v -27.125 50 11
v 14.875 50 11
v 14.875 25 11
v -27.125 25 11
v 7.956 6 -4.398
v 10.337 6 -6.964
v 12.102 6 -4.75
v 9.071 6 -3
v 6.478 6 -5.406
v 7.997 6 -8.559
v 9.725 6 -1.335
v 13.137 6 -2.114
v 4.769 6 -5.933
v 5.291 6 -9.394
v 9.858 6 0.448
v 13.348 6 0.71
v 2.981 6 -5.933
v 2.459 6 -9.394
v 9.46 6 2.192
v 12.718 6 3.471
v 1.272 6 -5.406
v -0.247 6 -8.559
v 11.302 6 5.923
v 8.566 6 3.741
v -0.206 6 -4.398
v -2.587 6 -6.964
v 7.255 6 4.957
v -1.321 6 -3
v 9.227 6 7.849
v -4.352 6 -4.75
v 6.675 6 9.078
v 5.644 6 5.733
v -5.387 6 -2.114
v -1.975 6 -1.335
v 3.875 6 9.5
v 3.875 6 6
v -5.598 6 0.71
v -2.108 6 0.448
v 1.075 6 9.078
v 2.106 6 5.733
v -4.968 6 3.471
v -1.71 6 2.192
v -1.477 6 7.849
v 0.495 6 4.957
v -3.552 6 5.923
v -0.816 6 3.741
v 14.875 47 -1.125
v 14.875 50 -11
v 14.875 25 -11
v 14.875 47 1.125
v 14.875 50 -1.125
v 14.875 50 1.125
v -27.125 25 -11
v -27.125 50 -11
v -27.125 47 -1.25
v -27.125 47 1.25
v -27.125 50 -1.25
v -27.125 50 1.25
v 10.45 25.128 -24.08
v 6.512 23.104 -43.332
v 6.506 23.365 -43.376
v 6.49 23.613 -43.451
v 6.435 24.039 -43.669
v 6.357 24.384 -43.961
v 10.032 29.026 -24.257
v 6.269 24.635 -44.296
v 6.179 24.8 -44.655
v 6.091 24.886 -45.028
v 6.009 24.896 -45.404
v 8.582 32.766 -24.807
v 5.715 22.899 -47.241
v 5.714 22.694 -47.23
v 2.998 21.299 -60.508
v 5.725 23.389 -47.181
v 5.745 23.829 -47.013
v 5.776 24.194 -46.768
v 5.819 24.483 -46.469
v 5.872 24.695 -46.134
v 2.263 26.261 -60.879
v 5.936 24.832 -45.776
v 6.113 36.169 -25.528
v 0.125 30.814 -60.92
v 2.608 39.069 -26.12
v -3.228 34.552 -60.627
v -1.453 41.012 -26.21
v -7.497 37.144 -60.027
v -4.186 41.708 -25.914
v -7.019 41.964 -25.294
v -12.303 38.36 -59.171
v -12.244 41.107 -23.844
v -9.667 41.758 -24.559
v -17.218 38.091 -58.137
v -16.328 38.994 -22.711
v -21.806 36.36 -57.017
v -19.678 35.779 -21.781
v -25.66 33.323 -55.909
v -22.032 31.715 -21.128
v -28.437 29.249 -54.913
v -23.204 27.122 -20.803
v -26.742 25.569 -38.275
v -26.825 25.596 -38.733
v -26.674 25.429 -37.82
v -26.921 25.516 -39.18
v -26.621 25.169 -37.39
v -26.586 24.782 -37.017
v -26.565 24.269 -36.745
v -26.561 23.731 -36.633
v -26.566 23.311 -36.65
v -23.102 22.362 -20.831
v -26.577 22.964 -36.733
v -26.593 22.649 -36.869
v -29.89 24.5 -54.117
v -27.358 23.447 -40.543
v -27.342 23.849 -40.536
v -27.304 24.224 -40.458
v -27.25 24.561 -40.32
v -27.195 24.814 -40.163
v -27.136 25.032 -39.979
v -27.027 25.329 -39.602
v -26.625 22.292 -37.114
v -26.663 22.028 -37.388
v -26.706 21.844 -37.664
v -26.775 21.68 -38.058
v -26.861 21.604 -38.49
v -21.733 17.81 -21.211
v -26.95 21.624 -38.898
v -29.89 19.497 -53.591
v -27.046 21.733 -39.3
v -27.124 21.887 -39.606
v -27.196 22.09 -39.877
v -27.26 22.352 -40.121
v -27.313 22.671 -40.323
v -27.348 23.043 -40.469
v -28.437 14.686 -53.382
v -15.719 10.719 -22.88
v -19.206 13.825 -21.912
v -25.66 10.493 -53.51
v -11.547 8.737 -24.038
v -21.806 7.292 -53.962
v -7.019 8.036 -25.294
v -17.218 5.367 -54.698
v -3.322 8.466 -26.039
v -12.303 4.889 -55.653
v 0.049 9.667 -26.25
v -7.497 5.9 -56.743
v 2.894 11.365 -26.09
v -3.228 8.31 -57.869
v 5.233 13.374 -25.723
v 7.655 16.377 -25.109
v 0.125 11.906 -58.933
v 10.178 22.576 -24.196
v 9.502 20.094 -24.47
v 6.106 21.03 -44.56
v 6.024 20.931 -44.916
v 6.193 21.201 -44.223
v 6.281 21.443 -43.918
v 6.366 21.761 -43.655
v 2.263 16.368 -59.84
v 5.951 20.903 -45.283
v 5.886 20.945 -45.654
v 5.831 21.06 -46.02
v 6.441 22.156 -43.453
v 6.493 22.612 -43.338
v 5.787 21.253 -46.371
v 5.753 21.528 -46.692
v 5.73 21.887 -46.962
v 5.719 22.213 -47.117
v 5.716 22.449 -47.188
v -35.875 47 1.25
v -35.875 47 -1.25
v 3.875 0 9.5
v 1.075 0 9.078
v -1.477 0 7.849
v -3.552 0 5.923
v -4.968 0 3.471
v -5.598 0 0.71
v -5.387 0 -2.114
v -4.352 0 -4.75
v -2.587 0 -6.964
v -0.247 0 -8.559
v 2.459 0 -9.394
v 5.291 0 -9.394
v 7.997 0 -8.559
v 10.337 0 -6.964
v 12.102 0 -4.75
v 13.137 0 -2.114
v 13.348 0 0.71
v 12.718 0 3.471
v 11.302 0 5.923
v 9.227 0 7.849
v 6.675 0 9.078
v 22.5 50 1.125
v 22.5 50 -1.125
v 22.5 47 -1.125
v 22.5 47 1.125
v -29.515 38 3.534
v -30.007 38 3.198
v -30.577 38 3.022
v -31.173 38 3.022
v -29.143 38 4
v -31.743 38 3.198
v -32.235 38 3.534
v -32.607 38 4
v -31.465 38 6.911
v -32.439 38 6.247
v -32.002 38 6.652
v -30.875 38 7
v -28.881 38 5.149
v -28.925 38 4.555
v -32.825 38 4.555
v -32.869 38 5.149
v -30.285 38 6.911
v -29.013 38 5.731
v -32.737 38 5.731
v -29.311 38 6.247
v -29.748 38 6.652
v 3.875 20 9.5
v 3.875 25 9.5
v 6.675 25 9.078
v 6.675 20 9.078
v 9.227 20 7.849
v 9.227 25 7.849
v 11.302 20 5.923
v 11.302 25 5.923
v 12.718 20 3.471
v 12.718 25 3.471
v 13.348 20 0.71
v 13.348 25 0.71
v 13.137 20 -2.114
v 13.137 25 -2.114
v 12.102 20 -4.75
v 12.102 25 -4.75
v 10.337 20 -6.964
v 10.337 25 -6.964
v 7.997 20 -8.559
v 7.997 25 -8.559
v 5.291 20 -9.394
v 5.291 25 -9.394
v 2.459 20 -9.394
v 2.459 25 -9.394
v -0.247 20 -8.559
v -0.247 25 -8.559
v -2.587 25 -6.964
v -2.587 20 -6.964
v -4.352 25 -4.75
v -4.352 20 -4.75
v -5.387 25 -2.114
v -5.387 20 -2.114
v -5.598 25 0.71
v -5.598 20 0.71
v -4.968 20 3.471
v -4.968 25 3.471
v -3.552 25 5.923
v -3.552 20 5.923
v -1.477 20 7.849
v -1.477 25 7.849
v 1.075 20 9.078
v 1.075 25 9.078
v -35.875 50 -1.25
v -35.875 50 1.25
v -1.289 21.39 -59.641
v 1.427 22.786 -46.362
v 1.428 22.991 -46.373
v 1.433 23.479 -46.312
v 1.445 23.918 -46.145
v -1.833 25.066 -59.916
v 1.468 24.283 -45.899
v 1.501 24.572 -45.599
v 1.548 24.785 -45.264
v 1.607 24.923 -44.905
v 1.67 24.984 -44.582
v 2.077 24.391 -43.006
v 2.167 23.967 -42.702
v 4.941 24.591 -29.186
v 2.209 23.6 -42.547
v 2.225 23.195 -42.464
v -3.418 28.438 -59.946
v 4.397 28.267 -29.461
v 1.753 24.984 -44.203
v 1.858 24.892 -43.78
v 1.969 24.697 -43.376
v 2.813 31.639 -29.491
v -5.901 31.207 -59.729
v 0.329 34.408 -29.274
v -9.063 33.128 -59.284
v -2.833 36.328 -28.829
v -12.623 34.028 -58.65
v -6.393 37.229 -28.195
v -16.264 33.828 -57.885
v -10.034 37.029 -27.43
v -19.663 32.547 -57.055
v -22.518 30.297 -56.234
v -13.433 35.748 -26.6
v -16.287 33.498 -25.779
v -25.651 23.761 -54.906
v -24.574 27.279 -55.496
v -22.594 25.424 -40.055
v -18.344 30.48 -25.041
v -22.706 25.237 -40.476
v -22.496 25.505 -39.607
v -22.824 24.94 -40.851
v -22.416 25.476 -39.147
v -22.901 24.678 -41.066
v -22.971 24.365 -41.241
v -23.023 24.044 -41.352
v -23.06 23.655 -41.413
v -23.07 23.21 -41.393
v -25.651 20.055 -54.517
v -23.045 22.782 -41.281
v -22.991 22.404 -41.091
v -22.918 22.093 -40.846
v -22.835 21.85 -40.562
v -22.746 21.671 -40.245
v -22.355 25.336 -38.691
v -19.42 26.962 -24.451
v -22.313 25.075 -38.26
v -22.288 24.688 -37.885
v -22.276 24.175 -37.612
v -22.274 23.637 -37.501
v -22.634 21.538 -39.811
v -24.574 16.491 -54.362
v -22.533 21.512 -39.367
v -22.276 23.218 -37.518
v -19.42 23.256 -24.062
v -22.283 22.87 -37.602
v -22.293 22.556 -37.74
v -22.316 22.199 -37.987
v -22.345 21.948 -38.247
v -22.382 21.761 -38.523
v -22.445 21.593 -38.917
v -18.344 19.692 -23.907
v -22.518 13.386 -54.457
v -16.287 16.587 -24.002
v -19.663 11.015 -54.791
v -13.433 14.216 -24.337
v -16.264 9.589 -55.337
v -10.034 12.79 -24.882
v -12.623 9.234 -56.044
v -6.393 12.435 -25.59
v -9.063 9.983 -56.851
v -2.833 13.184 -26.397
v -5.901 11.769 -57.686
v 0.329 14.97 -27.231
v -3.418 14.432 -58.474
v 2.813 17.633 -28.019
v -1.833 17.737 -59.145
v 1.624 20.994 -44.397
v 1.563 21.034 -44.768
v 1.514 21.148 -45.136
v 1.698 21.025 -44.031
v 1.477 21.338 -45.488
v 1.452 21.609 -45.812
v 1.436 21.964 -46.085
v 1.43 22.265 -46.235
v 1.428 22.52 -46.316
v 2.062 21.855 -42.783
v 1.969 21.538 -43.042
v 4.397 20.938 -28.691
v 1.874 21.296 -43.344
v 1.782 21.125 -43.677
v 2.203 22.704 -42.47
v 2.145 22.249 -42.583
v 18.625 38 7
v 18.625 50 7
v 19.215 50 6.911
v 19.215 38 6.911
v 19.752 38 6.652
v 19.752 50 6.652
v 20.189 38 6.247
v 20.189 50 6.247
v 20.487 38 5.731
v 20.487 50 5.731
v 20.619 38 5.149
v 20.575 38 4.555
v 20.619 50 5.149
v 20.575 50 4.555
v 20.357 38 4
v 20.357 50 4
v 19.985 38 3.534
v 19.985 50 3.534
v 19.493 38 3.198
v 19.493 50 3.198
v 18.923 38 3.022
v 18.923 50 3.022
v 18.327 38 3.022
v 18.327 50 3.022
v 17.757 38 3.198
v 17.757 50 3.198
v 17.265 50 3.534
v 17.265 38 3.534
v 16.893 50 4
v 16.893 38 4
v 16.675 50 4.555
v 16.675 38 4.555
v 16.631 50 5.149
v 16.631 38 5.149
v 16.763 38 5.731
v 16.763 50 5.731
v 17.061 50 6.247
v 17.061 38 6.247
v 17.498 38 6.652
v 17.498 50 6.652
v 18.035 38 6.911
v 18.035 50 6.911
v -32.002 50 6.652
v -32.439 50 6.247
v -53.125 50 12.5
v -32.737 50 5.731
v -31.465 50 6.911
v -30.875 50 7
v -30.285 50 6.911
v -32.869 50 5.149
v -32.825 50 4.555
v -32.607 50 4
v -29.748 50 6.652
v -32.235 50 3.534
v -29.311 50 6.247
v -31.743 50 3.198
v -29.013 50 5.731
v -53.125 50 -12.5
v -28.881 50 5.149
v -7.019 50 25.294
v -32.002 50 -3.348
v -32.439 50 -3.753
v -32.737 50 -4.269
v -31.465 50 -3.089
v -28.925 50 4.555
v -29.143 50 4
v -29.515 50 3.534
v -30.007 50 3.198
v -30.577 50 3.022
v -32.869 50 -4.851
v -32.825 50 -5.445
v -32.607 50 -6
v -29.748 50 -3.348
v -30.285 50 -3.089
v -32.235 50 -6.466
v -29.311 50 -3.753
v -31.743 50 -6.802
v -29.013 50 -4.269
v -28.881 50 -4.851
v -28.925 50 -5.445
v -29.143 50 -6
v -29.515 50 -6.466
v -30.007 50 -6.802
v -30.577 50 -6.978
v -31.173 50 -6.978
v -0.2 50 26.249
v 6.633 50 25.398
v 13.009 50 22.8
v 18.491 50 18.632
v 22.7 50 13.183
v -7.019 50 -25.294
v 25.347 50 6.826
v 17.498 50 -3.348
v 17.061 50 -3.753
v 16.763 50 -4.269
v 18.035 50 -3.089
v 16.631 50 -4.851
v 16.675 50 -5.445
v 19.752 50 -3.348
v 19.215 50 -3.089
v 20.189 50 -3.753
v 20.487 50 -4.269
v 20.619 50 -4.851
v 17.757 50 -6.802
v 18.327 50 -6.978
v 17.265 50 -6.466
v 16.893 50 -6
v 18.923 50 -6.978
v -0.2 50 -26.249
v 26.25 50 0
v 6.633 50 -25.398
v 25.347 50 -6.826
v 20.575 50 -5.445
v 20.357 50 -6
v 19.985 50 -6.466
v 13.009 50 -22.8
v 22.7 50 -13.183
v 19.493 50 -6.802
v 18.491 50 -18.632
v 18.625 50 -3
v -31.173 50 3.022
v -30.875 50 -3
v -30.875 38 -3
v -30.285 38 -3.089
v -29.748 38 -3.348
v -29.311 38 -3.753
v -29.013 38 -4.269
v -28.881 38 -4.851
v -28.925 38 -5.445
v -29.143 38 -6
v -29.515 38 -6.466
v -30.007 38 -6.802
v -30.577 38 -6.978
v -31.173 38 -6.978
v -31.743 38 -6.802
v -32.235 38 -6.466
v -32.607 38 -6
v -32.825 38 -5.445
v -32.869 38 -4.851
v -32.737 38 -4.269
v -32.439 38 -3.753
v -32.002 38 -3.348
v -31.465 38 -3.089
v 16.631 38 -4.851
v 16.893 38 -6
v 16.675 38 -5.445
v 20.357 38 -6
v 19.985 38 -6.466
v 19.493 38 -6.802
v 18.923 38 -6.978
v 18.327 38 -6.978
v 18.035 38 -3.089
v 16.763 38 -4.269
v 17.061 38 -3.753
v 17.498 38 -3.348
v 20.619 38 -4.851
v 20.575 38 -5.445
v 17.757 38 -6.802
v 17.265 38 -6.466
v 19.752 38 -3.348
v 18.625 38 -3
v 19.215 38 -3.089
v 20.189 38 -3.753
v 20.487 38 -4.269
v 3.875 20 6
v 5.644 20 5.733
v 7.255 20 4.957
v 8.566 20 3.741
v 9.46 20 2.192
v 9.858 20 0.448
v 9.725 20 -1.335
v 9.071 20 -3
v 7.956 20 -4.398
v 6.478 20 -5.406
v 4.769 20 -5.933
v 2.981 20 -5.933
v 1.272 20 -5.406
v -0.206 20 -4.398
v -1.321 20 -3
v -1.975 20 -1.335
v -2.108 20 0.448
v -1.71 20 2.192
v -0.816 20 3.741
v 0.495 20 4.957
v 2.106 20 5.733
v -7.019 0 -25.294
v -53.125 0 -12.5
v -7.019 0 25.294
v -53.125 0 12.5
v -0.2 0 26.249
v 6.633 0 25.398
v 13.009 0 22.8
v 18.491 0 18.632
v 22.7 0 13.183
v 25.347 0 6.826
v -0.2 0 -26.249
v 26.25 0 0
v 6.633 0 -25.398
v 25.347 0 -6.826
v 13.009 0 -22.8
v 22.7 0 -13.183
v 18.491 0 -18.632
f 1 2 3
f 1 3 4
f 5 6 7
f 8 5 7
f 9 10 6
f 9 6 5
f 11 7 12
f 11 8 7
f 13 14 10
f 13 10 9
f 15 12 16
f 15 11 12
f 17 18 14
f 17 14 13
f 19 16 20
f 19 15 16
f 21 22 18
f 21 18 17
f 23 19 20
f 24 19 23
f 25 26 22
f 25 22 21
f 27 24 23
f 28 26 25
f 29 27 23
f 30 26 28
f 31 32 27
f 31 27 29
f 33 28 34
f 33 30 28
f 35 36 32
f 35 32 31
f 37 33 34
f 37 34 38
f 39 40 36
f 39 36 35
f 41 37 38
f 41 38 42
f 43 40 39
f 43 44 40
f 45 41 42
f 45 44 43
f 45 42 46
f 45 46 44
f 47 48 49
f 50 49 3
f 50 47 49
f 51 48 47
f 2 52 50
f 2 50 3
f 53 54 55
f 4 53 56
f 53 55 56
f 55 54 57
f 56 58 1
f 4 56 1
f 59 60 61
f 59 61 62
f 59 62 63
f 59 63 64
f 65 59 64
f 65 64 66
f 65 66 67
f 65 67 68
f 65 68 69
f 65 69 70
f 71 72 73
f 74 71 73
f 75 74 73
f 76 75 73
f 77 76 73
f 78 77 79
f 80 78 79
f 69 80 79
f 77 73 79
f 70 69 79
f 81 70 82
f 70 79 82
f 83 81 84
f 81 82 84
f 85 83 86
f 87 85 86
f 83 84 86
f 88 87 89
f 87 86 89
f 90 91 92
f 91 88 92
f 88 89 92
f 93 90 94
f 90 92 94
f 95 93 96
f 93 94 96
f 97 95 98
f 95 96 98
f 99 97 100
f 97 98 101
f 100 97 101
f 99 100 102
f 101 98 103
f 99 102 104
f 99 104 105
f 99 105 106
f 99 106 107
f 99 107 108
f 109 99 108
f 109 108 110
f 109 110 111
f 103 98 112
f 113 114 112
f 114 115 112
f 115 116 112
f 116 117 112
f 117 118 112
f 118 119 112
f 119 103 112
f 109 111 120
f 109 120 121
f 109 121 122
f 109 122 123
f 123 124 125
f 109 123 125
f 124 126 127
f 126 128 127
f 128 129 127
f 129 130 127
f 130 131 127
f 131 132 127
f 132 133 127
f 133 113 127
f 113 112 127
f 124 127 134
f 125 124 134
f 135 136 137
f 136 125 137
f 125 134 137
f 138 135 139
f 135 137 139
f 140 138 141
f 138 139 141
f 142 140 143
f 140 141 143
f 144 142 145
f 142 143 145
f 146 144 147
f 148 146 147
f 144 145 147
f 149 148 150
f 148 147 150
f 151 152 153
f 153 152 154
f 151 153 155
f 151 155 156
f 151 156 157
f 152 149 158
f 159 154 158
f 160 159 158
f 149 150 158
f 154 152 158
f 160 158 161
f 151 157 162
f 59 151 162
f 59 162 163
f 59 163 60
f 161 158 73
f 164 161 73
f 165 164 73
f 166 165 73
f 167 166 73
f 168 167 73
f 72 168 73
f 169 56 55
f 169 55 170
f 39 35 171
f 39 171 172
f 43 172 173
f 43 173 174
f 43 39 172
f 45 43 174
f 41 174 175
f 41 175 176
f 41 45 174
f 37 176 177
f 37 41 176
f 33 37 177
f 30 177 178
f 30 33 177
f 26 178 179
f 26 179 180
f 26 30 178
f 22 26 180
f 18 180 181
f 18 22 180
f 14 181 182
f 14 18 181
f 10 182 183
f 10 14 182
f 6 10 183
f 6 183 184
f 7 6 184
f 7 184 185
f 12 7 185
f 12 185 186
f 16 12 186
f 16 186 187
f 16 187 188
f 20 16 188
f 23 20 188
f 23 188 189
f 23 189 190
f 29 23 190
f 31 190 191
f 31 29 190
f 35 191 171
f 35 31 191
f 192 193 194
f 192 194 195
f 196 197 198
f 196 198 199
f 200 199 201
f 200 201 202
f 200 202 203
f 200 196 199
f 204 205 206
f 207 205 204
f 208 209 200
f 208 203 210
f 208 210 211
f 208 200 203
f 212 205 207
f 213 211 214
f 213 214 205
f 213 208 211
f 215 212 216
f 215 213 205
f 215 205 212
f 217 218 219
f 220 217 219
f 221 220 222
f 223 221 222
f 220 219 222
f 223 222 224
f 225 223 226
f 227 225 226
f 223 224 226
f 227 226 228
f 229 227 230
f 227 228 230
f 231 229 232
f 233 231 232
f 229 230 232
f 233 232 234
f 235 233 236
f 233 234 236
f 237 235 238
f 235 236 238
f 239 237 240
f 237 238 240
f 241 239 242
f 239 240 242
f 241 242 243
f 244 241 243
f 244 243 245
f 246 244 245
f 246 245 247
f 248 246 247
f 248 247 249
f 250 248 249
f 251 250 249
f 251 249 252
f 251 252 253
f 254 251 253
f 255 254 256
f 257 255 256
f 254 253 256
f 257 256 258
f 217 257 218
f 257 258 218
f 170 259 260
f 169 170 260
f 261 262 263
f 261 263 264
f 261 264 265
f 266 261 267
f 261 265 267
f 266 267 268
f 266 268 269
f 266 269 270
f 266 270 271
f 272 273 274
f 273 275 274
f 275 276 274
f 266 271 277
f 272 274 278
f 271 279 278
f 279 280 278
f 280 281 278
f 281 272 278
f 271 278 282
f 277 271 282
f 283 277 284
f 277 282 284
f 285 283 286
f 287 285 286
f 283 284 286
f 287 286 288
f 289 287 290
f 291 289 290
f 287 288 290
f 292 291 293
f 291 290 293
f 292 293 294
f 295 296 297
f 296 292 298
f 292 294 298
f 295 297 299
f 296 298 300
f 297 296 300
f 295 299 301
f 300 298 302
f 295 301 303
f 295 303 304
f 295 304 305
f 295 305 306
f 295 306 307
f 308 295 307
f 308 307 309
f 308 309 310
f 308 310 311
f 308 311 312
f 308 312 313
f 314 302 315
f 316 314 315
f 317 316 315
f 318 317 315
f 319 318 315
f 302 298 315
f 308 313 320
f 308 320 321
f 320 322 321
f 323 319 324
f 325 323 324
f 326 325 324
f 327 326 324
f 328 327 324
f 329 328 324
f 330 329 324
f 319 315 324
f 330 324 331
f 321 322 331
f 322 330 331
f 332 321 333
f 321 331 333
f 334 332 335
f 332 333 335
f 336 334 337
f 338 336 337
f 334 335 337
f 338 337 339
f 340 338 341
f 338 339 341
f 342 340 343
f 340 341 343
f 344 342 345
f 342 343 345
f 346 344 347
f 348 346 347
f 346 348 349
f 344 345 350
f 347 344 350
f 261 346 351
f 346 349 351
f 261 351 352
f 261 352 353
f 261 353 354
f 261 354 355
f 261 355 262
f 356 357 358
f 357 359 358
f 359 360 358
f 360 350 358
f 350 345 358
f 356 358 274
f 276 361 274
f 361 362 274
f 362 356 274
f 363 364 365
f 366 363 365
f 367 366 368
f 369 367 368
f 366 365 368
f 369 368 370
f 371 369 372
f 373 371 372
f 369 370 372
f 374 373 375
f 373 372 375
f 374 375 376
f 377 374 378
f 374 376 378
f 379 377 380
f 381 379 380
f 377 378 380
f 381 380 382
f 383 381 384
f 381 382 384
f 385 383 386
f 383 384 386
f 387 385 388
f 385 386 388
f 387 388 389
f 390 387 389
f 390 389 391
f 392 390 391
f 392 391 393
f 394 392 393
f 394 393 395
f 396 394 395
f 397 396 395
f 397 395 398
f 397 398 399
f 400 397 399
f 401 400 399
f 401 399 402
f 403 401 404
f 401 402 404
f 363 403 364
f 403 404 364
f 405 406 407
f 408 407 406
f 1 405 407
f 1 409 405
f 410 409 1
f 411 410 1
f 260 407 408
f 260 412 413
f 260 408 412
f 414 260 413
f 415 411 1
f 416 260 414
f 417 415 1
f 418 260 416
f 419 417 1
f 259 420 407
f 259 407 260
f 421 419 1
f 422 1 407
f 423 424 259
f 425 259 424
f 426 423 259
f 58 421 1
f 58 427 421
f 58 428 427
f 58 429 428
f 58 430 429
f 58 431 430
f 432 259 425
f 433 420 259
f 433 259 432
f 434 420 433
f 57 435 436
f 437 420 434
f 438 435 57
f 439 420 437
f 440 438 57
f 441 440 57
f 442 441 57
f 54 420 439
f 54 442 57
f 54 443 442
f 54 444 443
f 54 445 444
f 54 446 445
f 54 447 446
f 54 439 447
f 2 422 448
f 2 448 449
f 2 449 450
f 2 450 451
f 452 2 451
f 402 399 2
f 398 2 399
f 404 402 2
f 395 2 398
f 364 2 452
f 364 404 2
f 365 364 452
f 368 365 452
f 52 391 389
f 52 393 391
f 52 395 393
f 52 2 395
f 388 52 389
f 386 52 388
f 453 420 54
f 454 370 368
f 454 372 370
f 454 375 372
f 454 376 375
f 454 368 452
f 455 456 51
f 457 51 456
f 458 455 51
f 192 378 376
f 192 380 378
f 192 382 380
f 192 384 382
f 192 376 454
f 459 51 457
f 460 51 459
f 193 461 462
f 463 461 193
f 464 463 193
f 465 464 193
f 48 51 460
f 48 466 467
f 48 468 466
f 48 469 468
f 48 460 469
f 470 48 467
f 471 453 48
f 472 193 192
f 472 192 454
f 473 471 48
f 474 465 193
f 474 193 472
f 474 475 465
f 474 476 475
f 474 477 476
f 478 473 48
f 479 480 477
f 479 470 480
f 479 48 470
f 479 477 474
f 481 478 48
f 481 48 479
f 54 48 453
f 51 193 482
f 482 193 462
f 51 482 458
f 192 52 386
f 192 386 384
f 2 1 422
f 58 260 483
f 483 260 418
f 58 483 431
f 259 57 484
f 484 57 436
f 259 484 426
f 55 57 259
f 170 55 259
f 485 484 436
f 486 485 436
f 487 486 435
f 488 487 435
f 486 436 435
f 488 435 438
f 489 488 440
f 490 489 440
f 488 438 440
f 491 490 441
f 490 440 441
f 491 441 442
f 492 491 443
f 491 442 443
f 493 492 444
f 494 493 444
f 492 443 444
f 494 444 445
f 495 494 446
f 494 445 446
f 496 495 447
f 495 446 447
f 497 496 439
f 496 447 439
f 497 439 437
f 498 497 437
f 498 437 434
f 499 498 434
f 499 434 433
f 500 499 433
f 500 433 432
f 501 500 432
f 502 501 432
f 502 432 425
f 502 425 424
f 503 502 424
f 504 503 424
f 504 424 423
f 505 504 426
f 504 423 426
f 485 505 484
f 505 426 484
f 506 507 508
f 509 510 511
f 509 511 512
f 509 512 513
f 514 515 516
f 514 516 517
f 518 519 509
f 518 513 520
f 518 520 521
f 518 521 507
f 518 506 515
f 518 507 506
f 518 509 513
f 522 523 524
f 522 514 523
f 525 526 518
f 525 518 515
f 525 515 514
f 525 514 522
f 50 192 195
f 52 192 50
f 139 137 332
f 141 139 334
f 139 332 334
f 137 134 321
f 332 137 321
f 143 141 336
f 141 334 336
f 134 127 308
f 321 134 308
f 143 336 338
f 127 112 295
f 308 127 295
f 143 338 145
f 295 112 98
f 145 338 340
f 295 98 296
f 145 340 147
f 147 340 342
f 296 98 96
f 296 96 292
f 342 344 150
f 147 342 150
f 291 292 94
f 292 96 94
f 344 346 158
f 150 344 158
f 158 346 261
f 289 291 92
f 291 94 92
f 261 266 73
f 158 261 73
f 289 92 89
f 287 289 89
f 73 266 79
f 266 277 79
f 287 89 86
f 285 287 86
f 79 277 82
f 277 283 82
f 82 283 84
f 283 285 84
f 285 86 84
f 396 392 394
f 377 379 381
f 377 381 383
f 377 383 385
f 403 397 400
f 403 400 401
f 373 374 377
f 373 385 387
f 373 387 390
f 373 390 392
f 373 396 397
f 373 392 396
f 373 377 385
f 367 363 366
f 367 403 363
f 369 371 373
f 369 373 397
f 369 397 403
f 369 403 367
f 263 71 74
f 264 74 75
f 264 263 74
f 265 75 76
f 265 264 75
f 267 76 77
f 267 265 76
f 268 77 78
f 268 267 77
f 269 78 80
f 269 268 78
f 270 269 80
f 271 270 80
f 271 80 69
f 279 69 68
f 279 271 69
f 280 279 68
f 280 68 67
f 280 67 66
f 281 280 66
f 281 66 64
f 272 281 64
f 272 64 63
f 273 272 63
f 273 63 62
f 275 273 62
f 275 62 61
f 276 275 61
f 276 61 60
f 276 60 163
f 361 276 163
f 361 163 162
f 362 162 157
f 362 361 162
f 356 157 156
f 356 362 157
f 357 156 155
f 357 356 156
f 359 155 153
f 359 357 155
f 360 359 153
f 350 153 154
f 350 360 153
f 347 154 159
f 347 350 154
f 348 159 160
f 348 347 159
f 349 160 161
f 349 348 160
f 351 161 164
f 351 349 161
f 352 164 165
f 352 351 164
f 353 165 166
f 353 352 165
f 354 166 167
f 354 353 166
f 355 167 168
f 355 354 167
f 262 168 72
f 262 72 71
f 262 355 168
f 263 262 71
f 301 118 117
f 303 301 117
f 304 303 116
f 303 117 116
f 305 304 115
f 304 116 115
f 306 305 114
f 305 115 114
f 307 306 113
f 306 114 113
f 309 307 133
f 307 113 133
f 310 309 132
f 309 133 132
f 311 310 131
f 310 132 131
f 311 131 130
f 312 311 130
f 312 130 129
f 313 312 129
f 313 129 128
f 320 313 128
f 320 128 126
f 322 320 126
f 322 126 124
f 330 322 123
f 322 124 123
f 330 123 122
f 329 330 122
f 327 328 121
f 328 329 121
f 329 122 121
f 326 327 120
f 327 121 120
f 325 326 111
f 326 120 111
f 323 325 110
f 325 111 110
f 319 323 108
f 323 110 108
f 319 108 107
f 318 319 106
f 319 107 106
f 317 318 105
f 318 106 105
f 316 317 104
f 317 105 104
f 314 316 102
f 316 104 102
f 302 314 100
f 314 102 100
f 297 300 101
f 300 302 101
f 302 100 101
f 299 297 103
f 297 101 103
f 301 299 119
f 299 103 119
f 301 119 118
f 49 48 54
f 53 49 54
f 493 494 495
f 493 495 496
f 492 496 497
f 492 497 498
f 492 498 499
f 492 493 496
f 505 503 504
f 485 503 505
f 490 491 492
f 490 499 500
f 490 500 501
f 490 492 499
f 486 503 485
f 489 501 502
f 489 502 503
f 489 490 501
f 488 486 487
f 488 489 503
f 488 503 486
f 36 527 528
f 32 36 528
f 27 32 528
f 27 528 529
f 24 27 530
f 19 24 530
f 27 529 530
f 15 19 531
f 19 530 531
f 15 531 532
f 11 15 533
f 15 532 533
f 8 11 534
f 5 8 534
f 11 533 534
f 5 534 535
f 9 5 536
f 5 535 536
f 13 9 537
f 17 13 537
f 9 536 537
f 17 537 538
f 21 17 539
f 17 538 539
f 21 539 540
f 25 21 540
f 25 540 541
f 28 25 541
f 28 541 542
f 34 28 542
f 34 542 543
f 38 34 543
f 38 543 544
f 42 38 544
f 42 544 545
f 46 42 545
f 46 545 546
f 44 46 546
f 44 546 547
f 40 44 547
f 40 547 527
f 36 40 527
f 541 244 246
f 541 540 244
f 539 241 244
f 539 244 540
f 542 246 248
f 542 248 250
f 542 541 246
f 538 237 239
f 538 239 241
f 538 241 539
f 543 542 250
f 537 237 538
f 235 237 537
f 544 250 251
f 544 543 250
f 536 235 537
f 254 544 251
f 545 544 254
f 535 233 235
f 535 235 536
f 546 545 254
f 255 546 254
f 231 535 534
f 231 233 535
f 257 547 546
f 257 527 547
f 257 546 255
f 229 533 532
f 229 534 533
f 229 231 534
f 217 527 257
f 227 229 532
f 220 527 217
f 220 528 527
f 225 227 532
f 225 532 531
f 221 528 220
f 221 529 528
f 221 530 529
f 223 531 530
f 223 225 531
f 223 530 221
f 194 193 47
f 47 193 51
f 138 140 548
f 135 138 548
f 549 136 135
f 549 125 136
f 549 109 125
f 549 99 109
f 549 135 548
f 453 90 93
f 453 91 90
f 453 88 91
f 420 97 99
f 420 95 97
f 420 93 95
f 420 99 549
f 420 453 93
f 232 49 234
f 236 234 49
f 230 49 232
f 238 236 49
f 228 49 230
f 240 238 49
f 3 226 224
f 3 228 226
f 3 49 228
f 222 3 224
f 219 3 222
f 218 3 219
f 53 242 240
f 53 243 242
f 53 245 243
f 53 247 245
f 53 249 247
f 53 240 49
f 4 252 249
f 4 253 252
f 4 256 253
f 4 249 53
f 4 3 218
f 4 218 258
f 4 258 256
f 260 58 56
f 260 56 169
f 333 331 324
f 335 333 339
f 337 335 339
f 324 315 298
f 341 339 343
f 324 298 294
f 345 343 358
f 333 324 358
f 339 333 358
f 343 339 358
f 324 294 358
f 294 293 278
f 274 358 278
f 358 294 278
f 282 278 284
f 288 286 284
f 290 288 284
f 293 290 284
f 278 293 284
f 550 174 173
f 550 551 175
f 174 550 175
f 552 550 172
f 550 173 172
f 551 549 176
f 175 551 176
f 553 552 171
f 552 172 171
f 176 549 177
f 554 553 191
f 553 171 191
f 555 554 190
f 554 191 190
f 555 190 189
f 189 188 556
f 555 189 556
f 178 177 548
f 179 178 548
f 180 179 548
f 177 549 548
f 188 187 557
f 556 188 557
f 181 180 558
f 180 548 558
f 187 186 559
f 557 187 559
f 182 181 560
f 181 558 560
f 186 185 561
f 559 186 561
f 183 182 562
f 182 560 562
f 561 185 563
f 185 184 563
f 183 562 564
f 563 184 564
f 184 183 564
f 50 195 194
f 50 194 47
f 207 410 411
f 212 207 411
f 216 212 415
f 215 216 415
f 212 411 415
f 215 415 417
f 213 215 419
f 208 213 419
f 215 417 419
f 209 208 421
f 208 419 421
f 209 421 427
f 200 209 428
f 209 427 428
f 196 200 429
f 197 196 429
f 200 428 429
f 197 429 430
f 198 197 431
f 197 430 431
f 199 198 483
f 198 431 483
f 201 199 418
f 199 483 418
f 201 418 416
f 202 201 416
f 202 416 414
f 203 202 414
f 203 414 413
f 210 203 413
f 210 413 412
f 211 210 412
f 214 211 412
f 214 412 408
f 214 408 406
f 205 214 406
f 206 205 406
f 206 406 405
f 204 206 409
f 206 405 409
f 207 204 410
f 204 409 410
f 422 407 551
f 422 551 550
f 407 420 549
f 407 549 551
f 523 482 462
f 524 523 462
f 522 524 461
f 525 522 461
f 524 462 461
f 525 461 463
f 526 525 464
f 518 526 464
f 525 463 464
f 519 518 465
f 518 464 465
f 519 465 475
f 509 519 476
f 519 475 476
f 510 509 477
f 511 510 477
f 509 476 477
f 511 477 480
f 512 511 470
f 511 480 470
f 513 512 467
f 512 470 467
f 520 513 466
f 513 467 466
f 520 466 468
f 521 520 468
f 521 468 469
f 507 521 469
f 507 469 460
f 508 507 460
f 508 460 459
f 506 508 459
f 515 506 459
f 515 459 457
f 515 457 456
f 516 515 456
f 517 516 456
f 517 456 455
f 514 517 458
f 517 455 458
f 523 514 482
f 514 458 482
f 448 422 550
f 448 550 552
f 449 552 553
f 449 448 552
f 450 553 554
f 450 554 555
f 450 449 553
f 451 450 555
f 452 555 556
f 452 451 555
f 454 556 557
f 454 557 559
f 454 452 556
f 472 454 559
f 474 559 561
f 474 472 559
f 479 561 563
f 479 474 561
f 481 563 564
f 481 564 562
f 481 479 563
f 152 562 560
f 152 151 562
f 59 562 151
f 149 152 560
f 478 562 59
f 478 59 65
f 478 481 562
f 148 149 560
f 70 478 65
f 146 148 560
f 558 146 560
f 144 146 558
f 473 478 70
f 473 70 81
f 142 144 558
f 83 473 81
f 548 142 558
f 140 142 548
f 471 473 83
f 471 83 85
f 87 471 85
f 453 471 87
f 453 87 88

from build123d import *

# Parameters (mm, degrees)
BOSS_EXTRUDE1_DEPTH       = 40
SKETCH2_W                 = 33.6
SKETCH2_H                 = 17.6
CUT_EXTRUDE1_DEPTH        = 20
SKETCH3_W                 = 7
SKETCH3_H                 = 2
CUT_EXTRUDE2_DEPTH        = 2.4
SKETCH4_W                 = 7
SKETCH4_H                 = 1.8
CUT_EXTRUDE3_DEPTH        = 2.4
REVOLVE1_START            = -44.95139953
REVOLVE1_OUTLINE_R        = 13.5
REVOLVE1_DEPTH            = 30.829897511
M18_CLEARANCE_HOLE1_D     = 20
M18_CLEARANCE_HOLE1_DEPTH = 25
SKETCH9_W                 = 1.6
SKETCH9_H                 = 27
CUT_EXTRUDE4_DEPTH        = 76.299241718
CUT_EXTRUDE4_DEPTH_BACK   = 76.299241718
SKETCH18_R                = 1.6
SCALE2_SCALE              = 1.25
SKETCH20_R                = 9.5
CUT_EXTRUDE5_DEPTH        = 5
SKETCH21_R                = 6
CUT_EXTRUDE6_DEPTH        = 87.235197147
CUT_EXTRUDE8_START        = -6
SKETCH25_R                = 9.5
CUT_EXTRUDE8_DEPTH        = 6
SKETCH27_R                = 2
CUT_EXTRUDE9_DEPTH        = 12


with BuildPart() as part:
    # Sketch1 → Boss-Extrude1 (new body)
    with BuildSketch(Plane(origin=(0, 40, 0), x_dir=(1, 0, 0), z_dir=(0, 1, 0))):
        with BuildLine():
            Line((-5.61521172, 20.235350191), (-42.5, 10))
            Line((-42.5, 10), (-42.5, -10))
            Line((-42.5, -10), (-5.61521172, -20.235350191))
            ThreePointArc((-5.61521172, -20.235350191), (21, 0), (-5.61521172, 20.235350191))
        make_face()
    extrude(amount=-BOSS_EXTRUDE1_DEPTH)

    # Sketch2 → Cut-Extrude1 (cut)
    with BuildSketch(Plane(origin=(0, 40, 0), x_dir=(-1, 0, 0), z_dir=(0, 1, 0))):
        with Locations((4.9, 0)):
            Rectangle(SKETCH2_W, SKETCH2_H)
    extrude(amount=-CUT_EXTRUDE1_DEPTH, mode=Mode.SUBTRACT)

    # Sketch3 → Cut-Extrude2 (cut)
    with BuildSketch(Plane(origin=(0, 40, 0), x_dir=(-1, 0, 0), z_dir=(0, 1, 0))):
        with Locations((25.2, 0)):
            Rectangle(SKETCH3_W, SKETCH3_H)
    extrude(amount=-CUT_EXTRUDE2_DEPTH, mode=Mode.SUBTRACT)

    # Sketch4 → Cut-Extrude3 (cut)
    with BuildSketch(Plane(origin=(0, 40, 0), x_dir=(-1, 0, 0), z_dir=(0, 1, 0))):
        with Locations((-14.5, 0)):
            Rectangle(SKETCH4_W, SKETCH4_H)
    extrude(amount=-CUT_EXTRUDE3_DEPTH, mode=Mode.SUBTRACT)

    # Revolve1: read off the stored shape, not the designer's step
    # Revolve1 outline → Revolve1 (add)
    with BuildSketch(Plane(origin=(0, 0, 0), x_dir=(0.9799247046208294, -0.02083962380947531, -0.19827577601224947), z_dir=(0.19936793441719802, 0.10243002349202102, 0.9745565745577031)).offset(REVOLVE1_START)):
        with Locations((-1.9070974, 22.005607966)):
            Circle(REVOLVE1_OUTLINE_R)
    extrude(amount=REVOLVE1_DEPTH)

    # M18 Clearance Hole1
    with Locations(Plane(origin=(-8.961867673, -4.60437291, -43.807681948), x_dir=(-0.9799247046208296, 0.02083962380947534, 0.19827577601224922), z_dir=(-0.19936793441719777, -0.10243002349202121, -0.9745565745577032))):
        with Locations((1.9070974, 22.005607966)):
            Hole(M18_CLEARANCE_HOLE1_D / 2, depth=M18_CLEARANCE_HOLE1_DEPTH)

    # Sketch9 → M3.5 Clearance Hole1 (revolve, cut)
    with BuildSketch(Plane(origin=(-18.009225855, 18.806465846, -31.591069121), x_dir=(-0.12392681772022805, 0.7153744254872676, -0.6876638533531477), z_dir=(0.1561720753640579, 0.6984304843277114, 0.6984304843277114))):
        with Locations((0.8, 13.5)):
            Rectangle(SKETCH9_W, SKETCH9_H)
    revolve(axis=Axis((-11.78670398, 18.674134235, -32.850120299), (-0.9799247046208297, 0.020839623809475325, 0.19827577601224802)), mode=Mode.SUBTRACT)

    # Sketch18 → Cut-Extrude4 (cut, two sides: drawn at the far end of the back side and taken through both)
    with BuildSketch(Plane(origin=(-1.740210315, 0.03700828, 0.352110268), x_dir=(-0.19823095447813932, 0.004215689735382395, -0.9801462730872066), z_dir=(0.9799247046208297, -0.020839623809475356, -0.19827577601224802)).offset(-CUT_EXTRUDE4_DEPTH_BACK)):
        with Locations(Location((34.613136918, 18.419306886, 0), (0, 0, 359.758405588))):
            Circle(SKETCH18_R)
    extrude(amount=CUT_EXTRUDE4_DEPTH + CUT_EXTRUDE4_DEPTH_BACK, mode=Mode.SUBTRACT)


with BuildPart() as part_1:
    # Scale2: scaled about (0, 0, 0)
    add(part.part.scale(SCALE2_SCALE))

    # Sketch20 → Cut-Extrude5 (cut)
    with BuildSketch(Plane(origin=(0, 25, 0), x_dir=(1, 0, 0), z_dir=(0, 1, 0))):
        with Locations(Location((3.875, 0, 0), (0, 0, 270))):
            Circle(SKETCH20_R)
    extrude(amount=-CUT_EXTRUDE5_DEPTH, mode=Mode.SUBTRACT)

    # Sketch21 → Cut-Extrude6 (cut, through all)
    with BuildSketch(Plane(origin=(0, 20, 0), x_dir=(1, 0, 0), z_dir=(0, 1, 0))):
        with Locations(Location((3.875, 0, 0), (0, 0, 270))):
            Circle(SKETCH21_R)
    extrude(amount=-CUT_EXTRUDE6_DEPTH, mode=Mode.SUBTRACT)

    # Sketch25 → Cut-Extrude8 (cut)
    with BuildSketch(Plane.XZ.offset(CUT_EXTRUDE8_START)):
        with Locations(Location((3.875, 0, 0), (0, 0, 90))):
            Circle(SKETCH25_R)
    extrude(amount=CUT_EXTRUDE8_DEPTH, mode=Mode.SUBTRACT)

    # Sketch27 → Cut-Extrude9 (cut)
    with BuildSketch(Plane(origin=(0, 50, 0), x_dir=(1, 0, 0), z_dir=(0, 1, 0))):
        with Locations(Location((18.625, 5, 0), (0, 0, 270))):
            Circle(SKETCH27_R)
        with Locations(Location((18.625, -5, 0), (0, 0, 270))):
            Circle(SKETCH27_R)
        with Locations(Location((-30.875, 5, 0), (0, 0, 270))):
            Circle(SKETCH27_R)
        with Locations(Location((-30.875, -5, 0), (0, 0, 270))):
            Circle(SKETCH27_R)
    extrude(amount=-CUT_EXTRUDE9_DEPTH, mode=Mode.SUBTRACT)


solid = part_1.part
